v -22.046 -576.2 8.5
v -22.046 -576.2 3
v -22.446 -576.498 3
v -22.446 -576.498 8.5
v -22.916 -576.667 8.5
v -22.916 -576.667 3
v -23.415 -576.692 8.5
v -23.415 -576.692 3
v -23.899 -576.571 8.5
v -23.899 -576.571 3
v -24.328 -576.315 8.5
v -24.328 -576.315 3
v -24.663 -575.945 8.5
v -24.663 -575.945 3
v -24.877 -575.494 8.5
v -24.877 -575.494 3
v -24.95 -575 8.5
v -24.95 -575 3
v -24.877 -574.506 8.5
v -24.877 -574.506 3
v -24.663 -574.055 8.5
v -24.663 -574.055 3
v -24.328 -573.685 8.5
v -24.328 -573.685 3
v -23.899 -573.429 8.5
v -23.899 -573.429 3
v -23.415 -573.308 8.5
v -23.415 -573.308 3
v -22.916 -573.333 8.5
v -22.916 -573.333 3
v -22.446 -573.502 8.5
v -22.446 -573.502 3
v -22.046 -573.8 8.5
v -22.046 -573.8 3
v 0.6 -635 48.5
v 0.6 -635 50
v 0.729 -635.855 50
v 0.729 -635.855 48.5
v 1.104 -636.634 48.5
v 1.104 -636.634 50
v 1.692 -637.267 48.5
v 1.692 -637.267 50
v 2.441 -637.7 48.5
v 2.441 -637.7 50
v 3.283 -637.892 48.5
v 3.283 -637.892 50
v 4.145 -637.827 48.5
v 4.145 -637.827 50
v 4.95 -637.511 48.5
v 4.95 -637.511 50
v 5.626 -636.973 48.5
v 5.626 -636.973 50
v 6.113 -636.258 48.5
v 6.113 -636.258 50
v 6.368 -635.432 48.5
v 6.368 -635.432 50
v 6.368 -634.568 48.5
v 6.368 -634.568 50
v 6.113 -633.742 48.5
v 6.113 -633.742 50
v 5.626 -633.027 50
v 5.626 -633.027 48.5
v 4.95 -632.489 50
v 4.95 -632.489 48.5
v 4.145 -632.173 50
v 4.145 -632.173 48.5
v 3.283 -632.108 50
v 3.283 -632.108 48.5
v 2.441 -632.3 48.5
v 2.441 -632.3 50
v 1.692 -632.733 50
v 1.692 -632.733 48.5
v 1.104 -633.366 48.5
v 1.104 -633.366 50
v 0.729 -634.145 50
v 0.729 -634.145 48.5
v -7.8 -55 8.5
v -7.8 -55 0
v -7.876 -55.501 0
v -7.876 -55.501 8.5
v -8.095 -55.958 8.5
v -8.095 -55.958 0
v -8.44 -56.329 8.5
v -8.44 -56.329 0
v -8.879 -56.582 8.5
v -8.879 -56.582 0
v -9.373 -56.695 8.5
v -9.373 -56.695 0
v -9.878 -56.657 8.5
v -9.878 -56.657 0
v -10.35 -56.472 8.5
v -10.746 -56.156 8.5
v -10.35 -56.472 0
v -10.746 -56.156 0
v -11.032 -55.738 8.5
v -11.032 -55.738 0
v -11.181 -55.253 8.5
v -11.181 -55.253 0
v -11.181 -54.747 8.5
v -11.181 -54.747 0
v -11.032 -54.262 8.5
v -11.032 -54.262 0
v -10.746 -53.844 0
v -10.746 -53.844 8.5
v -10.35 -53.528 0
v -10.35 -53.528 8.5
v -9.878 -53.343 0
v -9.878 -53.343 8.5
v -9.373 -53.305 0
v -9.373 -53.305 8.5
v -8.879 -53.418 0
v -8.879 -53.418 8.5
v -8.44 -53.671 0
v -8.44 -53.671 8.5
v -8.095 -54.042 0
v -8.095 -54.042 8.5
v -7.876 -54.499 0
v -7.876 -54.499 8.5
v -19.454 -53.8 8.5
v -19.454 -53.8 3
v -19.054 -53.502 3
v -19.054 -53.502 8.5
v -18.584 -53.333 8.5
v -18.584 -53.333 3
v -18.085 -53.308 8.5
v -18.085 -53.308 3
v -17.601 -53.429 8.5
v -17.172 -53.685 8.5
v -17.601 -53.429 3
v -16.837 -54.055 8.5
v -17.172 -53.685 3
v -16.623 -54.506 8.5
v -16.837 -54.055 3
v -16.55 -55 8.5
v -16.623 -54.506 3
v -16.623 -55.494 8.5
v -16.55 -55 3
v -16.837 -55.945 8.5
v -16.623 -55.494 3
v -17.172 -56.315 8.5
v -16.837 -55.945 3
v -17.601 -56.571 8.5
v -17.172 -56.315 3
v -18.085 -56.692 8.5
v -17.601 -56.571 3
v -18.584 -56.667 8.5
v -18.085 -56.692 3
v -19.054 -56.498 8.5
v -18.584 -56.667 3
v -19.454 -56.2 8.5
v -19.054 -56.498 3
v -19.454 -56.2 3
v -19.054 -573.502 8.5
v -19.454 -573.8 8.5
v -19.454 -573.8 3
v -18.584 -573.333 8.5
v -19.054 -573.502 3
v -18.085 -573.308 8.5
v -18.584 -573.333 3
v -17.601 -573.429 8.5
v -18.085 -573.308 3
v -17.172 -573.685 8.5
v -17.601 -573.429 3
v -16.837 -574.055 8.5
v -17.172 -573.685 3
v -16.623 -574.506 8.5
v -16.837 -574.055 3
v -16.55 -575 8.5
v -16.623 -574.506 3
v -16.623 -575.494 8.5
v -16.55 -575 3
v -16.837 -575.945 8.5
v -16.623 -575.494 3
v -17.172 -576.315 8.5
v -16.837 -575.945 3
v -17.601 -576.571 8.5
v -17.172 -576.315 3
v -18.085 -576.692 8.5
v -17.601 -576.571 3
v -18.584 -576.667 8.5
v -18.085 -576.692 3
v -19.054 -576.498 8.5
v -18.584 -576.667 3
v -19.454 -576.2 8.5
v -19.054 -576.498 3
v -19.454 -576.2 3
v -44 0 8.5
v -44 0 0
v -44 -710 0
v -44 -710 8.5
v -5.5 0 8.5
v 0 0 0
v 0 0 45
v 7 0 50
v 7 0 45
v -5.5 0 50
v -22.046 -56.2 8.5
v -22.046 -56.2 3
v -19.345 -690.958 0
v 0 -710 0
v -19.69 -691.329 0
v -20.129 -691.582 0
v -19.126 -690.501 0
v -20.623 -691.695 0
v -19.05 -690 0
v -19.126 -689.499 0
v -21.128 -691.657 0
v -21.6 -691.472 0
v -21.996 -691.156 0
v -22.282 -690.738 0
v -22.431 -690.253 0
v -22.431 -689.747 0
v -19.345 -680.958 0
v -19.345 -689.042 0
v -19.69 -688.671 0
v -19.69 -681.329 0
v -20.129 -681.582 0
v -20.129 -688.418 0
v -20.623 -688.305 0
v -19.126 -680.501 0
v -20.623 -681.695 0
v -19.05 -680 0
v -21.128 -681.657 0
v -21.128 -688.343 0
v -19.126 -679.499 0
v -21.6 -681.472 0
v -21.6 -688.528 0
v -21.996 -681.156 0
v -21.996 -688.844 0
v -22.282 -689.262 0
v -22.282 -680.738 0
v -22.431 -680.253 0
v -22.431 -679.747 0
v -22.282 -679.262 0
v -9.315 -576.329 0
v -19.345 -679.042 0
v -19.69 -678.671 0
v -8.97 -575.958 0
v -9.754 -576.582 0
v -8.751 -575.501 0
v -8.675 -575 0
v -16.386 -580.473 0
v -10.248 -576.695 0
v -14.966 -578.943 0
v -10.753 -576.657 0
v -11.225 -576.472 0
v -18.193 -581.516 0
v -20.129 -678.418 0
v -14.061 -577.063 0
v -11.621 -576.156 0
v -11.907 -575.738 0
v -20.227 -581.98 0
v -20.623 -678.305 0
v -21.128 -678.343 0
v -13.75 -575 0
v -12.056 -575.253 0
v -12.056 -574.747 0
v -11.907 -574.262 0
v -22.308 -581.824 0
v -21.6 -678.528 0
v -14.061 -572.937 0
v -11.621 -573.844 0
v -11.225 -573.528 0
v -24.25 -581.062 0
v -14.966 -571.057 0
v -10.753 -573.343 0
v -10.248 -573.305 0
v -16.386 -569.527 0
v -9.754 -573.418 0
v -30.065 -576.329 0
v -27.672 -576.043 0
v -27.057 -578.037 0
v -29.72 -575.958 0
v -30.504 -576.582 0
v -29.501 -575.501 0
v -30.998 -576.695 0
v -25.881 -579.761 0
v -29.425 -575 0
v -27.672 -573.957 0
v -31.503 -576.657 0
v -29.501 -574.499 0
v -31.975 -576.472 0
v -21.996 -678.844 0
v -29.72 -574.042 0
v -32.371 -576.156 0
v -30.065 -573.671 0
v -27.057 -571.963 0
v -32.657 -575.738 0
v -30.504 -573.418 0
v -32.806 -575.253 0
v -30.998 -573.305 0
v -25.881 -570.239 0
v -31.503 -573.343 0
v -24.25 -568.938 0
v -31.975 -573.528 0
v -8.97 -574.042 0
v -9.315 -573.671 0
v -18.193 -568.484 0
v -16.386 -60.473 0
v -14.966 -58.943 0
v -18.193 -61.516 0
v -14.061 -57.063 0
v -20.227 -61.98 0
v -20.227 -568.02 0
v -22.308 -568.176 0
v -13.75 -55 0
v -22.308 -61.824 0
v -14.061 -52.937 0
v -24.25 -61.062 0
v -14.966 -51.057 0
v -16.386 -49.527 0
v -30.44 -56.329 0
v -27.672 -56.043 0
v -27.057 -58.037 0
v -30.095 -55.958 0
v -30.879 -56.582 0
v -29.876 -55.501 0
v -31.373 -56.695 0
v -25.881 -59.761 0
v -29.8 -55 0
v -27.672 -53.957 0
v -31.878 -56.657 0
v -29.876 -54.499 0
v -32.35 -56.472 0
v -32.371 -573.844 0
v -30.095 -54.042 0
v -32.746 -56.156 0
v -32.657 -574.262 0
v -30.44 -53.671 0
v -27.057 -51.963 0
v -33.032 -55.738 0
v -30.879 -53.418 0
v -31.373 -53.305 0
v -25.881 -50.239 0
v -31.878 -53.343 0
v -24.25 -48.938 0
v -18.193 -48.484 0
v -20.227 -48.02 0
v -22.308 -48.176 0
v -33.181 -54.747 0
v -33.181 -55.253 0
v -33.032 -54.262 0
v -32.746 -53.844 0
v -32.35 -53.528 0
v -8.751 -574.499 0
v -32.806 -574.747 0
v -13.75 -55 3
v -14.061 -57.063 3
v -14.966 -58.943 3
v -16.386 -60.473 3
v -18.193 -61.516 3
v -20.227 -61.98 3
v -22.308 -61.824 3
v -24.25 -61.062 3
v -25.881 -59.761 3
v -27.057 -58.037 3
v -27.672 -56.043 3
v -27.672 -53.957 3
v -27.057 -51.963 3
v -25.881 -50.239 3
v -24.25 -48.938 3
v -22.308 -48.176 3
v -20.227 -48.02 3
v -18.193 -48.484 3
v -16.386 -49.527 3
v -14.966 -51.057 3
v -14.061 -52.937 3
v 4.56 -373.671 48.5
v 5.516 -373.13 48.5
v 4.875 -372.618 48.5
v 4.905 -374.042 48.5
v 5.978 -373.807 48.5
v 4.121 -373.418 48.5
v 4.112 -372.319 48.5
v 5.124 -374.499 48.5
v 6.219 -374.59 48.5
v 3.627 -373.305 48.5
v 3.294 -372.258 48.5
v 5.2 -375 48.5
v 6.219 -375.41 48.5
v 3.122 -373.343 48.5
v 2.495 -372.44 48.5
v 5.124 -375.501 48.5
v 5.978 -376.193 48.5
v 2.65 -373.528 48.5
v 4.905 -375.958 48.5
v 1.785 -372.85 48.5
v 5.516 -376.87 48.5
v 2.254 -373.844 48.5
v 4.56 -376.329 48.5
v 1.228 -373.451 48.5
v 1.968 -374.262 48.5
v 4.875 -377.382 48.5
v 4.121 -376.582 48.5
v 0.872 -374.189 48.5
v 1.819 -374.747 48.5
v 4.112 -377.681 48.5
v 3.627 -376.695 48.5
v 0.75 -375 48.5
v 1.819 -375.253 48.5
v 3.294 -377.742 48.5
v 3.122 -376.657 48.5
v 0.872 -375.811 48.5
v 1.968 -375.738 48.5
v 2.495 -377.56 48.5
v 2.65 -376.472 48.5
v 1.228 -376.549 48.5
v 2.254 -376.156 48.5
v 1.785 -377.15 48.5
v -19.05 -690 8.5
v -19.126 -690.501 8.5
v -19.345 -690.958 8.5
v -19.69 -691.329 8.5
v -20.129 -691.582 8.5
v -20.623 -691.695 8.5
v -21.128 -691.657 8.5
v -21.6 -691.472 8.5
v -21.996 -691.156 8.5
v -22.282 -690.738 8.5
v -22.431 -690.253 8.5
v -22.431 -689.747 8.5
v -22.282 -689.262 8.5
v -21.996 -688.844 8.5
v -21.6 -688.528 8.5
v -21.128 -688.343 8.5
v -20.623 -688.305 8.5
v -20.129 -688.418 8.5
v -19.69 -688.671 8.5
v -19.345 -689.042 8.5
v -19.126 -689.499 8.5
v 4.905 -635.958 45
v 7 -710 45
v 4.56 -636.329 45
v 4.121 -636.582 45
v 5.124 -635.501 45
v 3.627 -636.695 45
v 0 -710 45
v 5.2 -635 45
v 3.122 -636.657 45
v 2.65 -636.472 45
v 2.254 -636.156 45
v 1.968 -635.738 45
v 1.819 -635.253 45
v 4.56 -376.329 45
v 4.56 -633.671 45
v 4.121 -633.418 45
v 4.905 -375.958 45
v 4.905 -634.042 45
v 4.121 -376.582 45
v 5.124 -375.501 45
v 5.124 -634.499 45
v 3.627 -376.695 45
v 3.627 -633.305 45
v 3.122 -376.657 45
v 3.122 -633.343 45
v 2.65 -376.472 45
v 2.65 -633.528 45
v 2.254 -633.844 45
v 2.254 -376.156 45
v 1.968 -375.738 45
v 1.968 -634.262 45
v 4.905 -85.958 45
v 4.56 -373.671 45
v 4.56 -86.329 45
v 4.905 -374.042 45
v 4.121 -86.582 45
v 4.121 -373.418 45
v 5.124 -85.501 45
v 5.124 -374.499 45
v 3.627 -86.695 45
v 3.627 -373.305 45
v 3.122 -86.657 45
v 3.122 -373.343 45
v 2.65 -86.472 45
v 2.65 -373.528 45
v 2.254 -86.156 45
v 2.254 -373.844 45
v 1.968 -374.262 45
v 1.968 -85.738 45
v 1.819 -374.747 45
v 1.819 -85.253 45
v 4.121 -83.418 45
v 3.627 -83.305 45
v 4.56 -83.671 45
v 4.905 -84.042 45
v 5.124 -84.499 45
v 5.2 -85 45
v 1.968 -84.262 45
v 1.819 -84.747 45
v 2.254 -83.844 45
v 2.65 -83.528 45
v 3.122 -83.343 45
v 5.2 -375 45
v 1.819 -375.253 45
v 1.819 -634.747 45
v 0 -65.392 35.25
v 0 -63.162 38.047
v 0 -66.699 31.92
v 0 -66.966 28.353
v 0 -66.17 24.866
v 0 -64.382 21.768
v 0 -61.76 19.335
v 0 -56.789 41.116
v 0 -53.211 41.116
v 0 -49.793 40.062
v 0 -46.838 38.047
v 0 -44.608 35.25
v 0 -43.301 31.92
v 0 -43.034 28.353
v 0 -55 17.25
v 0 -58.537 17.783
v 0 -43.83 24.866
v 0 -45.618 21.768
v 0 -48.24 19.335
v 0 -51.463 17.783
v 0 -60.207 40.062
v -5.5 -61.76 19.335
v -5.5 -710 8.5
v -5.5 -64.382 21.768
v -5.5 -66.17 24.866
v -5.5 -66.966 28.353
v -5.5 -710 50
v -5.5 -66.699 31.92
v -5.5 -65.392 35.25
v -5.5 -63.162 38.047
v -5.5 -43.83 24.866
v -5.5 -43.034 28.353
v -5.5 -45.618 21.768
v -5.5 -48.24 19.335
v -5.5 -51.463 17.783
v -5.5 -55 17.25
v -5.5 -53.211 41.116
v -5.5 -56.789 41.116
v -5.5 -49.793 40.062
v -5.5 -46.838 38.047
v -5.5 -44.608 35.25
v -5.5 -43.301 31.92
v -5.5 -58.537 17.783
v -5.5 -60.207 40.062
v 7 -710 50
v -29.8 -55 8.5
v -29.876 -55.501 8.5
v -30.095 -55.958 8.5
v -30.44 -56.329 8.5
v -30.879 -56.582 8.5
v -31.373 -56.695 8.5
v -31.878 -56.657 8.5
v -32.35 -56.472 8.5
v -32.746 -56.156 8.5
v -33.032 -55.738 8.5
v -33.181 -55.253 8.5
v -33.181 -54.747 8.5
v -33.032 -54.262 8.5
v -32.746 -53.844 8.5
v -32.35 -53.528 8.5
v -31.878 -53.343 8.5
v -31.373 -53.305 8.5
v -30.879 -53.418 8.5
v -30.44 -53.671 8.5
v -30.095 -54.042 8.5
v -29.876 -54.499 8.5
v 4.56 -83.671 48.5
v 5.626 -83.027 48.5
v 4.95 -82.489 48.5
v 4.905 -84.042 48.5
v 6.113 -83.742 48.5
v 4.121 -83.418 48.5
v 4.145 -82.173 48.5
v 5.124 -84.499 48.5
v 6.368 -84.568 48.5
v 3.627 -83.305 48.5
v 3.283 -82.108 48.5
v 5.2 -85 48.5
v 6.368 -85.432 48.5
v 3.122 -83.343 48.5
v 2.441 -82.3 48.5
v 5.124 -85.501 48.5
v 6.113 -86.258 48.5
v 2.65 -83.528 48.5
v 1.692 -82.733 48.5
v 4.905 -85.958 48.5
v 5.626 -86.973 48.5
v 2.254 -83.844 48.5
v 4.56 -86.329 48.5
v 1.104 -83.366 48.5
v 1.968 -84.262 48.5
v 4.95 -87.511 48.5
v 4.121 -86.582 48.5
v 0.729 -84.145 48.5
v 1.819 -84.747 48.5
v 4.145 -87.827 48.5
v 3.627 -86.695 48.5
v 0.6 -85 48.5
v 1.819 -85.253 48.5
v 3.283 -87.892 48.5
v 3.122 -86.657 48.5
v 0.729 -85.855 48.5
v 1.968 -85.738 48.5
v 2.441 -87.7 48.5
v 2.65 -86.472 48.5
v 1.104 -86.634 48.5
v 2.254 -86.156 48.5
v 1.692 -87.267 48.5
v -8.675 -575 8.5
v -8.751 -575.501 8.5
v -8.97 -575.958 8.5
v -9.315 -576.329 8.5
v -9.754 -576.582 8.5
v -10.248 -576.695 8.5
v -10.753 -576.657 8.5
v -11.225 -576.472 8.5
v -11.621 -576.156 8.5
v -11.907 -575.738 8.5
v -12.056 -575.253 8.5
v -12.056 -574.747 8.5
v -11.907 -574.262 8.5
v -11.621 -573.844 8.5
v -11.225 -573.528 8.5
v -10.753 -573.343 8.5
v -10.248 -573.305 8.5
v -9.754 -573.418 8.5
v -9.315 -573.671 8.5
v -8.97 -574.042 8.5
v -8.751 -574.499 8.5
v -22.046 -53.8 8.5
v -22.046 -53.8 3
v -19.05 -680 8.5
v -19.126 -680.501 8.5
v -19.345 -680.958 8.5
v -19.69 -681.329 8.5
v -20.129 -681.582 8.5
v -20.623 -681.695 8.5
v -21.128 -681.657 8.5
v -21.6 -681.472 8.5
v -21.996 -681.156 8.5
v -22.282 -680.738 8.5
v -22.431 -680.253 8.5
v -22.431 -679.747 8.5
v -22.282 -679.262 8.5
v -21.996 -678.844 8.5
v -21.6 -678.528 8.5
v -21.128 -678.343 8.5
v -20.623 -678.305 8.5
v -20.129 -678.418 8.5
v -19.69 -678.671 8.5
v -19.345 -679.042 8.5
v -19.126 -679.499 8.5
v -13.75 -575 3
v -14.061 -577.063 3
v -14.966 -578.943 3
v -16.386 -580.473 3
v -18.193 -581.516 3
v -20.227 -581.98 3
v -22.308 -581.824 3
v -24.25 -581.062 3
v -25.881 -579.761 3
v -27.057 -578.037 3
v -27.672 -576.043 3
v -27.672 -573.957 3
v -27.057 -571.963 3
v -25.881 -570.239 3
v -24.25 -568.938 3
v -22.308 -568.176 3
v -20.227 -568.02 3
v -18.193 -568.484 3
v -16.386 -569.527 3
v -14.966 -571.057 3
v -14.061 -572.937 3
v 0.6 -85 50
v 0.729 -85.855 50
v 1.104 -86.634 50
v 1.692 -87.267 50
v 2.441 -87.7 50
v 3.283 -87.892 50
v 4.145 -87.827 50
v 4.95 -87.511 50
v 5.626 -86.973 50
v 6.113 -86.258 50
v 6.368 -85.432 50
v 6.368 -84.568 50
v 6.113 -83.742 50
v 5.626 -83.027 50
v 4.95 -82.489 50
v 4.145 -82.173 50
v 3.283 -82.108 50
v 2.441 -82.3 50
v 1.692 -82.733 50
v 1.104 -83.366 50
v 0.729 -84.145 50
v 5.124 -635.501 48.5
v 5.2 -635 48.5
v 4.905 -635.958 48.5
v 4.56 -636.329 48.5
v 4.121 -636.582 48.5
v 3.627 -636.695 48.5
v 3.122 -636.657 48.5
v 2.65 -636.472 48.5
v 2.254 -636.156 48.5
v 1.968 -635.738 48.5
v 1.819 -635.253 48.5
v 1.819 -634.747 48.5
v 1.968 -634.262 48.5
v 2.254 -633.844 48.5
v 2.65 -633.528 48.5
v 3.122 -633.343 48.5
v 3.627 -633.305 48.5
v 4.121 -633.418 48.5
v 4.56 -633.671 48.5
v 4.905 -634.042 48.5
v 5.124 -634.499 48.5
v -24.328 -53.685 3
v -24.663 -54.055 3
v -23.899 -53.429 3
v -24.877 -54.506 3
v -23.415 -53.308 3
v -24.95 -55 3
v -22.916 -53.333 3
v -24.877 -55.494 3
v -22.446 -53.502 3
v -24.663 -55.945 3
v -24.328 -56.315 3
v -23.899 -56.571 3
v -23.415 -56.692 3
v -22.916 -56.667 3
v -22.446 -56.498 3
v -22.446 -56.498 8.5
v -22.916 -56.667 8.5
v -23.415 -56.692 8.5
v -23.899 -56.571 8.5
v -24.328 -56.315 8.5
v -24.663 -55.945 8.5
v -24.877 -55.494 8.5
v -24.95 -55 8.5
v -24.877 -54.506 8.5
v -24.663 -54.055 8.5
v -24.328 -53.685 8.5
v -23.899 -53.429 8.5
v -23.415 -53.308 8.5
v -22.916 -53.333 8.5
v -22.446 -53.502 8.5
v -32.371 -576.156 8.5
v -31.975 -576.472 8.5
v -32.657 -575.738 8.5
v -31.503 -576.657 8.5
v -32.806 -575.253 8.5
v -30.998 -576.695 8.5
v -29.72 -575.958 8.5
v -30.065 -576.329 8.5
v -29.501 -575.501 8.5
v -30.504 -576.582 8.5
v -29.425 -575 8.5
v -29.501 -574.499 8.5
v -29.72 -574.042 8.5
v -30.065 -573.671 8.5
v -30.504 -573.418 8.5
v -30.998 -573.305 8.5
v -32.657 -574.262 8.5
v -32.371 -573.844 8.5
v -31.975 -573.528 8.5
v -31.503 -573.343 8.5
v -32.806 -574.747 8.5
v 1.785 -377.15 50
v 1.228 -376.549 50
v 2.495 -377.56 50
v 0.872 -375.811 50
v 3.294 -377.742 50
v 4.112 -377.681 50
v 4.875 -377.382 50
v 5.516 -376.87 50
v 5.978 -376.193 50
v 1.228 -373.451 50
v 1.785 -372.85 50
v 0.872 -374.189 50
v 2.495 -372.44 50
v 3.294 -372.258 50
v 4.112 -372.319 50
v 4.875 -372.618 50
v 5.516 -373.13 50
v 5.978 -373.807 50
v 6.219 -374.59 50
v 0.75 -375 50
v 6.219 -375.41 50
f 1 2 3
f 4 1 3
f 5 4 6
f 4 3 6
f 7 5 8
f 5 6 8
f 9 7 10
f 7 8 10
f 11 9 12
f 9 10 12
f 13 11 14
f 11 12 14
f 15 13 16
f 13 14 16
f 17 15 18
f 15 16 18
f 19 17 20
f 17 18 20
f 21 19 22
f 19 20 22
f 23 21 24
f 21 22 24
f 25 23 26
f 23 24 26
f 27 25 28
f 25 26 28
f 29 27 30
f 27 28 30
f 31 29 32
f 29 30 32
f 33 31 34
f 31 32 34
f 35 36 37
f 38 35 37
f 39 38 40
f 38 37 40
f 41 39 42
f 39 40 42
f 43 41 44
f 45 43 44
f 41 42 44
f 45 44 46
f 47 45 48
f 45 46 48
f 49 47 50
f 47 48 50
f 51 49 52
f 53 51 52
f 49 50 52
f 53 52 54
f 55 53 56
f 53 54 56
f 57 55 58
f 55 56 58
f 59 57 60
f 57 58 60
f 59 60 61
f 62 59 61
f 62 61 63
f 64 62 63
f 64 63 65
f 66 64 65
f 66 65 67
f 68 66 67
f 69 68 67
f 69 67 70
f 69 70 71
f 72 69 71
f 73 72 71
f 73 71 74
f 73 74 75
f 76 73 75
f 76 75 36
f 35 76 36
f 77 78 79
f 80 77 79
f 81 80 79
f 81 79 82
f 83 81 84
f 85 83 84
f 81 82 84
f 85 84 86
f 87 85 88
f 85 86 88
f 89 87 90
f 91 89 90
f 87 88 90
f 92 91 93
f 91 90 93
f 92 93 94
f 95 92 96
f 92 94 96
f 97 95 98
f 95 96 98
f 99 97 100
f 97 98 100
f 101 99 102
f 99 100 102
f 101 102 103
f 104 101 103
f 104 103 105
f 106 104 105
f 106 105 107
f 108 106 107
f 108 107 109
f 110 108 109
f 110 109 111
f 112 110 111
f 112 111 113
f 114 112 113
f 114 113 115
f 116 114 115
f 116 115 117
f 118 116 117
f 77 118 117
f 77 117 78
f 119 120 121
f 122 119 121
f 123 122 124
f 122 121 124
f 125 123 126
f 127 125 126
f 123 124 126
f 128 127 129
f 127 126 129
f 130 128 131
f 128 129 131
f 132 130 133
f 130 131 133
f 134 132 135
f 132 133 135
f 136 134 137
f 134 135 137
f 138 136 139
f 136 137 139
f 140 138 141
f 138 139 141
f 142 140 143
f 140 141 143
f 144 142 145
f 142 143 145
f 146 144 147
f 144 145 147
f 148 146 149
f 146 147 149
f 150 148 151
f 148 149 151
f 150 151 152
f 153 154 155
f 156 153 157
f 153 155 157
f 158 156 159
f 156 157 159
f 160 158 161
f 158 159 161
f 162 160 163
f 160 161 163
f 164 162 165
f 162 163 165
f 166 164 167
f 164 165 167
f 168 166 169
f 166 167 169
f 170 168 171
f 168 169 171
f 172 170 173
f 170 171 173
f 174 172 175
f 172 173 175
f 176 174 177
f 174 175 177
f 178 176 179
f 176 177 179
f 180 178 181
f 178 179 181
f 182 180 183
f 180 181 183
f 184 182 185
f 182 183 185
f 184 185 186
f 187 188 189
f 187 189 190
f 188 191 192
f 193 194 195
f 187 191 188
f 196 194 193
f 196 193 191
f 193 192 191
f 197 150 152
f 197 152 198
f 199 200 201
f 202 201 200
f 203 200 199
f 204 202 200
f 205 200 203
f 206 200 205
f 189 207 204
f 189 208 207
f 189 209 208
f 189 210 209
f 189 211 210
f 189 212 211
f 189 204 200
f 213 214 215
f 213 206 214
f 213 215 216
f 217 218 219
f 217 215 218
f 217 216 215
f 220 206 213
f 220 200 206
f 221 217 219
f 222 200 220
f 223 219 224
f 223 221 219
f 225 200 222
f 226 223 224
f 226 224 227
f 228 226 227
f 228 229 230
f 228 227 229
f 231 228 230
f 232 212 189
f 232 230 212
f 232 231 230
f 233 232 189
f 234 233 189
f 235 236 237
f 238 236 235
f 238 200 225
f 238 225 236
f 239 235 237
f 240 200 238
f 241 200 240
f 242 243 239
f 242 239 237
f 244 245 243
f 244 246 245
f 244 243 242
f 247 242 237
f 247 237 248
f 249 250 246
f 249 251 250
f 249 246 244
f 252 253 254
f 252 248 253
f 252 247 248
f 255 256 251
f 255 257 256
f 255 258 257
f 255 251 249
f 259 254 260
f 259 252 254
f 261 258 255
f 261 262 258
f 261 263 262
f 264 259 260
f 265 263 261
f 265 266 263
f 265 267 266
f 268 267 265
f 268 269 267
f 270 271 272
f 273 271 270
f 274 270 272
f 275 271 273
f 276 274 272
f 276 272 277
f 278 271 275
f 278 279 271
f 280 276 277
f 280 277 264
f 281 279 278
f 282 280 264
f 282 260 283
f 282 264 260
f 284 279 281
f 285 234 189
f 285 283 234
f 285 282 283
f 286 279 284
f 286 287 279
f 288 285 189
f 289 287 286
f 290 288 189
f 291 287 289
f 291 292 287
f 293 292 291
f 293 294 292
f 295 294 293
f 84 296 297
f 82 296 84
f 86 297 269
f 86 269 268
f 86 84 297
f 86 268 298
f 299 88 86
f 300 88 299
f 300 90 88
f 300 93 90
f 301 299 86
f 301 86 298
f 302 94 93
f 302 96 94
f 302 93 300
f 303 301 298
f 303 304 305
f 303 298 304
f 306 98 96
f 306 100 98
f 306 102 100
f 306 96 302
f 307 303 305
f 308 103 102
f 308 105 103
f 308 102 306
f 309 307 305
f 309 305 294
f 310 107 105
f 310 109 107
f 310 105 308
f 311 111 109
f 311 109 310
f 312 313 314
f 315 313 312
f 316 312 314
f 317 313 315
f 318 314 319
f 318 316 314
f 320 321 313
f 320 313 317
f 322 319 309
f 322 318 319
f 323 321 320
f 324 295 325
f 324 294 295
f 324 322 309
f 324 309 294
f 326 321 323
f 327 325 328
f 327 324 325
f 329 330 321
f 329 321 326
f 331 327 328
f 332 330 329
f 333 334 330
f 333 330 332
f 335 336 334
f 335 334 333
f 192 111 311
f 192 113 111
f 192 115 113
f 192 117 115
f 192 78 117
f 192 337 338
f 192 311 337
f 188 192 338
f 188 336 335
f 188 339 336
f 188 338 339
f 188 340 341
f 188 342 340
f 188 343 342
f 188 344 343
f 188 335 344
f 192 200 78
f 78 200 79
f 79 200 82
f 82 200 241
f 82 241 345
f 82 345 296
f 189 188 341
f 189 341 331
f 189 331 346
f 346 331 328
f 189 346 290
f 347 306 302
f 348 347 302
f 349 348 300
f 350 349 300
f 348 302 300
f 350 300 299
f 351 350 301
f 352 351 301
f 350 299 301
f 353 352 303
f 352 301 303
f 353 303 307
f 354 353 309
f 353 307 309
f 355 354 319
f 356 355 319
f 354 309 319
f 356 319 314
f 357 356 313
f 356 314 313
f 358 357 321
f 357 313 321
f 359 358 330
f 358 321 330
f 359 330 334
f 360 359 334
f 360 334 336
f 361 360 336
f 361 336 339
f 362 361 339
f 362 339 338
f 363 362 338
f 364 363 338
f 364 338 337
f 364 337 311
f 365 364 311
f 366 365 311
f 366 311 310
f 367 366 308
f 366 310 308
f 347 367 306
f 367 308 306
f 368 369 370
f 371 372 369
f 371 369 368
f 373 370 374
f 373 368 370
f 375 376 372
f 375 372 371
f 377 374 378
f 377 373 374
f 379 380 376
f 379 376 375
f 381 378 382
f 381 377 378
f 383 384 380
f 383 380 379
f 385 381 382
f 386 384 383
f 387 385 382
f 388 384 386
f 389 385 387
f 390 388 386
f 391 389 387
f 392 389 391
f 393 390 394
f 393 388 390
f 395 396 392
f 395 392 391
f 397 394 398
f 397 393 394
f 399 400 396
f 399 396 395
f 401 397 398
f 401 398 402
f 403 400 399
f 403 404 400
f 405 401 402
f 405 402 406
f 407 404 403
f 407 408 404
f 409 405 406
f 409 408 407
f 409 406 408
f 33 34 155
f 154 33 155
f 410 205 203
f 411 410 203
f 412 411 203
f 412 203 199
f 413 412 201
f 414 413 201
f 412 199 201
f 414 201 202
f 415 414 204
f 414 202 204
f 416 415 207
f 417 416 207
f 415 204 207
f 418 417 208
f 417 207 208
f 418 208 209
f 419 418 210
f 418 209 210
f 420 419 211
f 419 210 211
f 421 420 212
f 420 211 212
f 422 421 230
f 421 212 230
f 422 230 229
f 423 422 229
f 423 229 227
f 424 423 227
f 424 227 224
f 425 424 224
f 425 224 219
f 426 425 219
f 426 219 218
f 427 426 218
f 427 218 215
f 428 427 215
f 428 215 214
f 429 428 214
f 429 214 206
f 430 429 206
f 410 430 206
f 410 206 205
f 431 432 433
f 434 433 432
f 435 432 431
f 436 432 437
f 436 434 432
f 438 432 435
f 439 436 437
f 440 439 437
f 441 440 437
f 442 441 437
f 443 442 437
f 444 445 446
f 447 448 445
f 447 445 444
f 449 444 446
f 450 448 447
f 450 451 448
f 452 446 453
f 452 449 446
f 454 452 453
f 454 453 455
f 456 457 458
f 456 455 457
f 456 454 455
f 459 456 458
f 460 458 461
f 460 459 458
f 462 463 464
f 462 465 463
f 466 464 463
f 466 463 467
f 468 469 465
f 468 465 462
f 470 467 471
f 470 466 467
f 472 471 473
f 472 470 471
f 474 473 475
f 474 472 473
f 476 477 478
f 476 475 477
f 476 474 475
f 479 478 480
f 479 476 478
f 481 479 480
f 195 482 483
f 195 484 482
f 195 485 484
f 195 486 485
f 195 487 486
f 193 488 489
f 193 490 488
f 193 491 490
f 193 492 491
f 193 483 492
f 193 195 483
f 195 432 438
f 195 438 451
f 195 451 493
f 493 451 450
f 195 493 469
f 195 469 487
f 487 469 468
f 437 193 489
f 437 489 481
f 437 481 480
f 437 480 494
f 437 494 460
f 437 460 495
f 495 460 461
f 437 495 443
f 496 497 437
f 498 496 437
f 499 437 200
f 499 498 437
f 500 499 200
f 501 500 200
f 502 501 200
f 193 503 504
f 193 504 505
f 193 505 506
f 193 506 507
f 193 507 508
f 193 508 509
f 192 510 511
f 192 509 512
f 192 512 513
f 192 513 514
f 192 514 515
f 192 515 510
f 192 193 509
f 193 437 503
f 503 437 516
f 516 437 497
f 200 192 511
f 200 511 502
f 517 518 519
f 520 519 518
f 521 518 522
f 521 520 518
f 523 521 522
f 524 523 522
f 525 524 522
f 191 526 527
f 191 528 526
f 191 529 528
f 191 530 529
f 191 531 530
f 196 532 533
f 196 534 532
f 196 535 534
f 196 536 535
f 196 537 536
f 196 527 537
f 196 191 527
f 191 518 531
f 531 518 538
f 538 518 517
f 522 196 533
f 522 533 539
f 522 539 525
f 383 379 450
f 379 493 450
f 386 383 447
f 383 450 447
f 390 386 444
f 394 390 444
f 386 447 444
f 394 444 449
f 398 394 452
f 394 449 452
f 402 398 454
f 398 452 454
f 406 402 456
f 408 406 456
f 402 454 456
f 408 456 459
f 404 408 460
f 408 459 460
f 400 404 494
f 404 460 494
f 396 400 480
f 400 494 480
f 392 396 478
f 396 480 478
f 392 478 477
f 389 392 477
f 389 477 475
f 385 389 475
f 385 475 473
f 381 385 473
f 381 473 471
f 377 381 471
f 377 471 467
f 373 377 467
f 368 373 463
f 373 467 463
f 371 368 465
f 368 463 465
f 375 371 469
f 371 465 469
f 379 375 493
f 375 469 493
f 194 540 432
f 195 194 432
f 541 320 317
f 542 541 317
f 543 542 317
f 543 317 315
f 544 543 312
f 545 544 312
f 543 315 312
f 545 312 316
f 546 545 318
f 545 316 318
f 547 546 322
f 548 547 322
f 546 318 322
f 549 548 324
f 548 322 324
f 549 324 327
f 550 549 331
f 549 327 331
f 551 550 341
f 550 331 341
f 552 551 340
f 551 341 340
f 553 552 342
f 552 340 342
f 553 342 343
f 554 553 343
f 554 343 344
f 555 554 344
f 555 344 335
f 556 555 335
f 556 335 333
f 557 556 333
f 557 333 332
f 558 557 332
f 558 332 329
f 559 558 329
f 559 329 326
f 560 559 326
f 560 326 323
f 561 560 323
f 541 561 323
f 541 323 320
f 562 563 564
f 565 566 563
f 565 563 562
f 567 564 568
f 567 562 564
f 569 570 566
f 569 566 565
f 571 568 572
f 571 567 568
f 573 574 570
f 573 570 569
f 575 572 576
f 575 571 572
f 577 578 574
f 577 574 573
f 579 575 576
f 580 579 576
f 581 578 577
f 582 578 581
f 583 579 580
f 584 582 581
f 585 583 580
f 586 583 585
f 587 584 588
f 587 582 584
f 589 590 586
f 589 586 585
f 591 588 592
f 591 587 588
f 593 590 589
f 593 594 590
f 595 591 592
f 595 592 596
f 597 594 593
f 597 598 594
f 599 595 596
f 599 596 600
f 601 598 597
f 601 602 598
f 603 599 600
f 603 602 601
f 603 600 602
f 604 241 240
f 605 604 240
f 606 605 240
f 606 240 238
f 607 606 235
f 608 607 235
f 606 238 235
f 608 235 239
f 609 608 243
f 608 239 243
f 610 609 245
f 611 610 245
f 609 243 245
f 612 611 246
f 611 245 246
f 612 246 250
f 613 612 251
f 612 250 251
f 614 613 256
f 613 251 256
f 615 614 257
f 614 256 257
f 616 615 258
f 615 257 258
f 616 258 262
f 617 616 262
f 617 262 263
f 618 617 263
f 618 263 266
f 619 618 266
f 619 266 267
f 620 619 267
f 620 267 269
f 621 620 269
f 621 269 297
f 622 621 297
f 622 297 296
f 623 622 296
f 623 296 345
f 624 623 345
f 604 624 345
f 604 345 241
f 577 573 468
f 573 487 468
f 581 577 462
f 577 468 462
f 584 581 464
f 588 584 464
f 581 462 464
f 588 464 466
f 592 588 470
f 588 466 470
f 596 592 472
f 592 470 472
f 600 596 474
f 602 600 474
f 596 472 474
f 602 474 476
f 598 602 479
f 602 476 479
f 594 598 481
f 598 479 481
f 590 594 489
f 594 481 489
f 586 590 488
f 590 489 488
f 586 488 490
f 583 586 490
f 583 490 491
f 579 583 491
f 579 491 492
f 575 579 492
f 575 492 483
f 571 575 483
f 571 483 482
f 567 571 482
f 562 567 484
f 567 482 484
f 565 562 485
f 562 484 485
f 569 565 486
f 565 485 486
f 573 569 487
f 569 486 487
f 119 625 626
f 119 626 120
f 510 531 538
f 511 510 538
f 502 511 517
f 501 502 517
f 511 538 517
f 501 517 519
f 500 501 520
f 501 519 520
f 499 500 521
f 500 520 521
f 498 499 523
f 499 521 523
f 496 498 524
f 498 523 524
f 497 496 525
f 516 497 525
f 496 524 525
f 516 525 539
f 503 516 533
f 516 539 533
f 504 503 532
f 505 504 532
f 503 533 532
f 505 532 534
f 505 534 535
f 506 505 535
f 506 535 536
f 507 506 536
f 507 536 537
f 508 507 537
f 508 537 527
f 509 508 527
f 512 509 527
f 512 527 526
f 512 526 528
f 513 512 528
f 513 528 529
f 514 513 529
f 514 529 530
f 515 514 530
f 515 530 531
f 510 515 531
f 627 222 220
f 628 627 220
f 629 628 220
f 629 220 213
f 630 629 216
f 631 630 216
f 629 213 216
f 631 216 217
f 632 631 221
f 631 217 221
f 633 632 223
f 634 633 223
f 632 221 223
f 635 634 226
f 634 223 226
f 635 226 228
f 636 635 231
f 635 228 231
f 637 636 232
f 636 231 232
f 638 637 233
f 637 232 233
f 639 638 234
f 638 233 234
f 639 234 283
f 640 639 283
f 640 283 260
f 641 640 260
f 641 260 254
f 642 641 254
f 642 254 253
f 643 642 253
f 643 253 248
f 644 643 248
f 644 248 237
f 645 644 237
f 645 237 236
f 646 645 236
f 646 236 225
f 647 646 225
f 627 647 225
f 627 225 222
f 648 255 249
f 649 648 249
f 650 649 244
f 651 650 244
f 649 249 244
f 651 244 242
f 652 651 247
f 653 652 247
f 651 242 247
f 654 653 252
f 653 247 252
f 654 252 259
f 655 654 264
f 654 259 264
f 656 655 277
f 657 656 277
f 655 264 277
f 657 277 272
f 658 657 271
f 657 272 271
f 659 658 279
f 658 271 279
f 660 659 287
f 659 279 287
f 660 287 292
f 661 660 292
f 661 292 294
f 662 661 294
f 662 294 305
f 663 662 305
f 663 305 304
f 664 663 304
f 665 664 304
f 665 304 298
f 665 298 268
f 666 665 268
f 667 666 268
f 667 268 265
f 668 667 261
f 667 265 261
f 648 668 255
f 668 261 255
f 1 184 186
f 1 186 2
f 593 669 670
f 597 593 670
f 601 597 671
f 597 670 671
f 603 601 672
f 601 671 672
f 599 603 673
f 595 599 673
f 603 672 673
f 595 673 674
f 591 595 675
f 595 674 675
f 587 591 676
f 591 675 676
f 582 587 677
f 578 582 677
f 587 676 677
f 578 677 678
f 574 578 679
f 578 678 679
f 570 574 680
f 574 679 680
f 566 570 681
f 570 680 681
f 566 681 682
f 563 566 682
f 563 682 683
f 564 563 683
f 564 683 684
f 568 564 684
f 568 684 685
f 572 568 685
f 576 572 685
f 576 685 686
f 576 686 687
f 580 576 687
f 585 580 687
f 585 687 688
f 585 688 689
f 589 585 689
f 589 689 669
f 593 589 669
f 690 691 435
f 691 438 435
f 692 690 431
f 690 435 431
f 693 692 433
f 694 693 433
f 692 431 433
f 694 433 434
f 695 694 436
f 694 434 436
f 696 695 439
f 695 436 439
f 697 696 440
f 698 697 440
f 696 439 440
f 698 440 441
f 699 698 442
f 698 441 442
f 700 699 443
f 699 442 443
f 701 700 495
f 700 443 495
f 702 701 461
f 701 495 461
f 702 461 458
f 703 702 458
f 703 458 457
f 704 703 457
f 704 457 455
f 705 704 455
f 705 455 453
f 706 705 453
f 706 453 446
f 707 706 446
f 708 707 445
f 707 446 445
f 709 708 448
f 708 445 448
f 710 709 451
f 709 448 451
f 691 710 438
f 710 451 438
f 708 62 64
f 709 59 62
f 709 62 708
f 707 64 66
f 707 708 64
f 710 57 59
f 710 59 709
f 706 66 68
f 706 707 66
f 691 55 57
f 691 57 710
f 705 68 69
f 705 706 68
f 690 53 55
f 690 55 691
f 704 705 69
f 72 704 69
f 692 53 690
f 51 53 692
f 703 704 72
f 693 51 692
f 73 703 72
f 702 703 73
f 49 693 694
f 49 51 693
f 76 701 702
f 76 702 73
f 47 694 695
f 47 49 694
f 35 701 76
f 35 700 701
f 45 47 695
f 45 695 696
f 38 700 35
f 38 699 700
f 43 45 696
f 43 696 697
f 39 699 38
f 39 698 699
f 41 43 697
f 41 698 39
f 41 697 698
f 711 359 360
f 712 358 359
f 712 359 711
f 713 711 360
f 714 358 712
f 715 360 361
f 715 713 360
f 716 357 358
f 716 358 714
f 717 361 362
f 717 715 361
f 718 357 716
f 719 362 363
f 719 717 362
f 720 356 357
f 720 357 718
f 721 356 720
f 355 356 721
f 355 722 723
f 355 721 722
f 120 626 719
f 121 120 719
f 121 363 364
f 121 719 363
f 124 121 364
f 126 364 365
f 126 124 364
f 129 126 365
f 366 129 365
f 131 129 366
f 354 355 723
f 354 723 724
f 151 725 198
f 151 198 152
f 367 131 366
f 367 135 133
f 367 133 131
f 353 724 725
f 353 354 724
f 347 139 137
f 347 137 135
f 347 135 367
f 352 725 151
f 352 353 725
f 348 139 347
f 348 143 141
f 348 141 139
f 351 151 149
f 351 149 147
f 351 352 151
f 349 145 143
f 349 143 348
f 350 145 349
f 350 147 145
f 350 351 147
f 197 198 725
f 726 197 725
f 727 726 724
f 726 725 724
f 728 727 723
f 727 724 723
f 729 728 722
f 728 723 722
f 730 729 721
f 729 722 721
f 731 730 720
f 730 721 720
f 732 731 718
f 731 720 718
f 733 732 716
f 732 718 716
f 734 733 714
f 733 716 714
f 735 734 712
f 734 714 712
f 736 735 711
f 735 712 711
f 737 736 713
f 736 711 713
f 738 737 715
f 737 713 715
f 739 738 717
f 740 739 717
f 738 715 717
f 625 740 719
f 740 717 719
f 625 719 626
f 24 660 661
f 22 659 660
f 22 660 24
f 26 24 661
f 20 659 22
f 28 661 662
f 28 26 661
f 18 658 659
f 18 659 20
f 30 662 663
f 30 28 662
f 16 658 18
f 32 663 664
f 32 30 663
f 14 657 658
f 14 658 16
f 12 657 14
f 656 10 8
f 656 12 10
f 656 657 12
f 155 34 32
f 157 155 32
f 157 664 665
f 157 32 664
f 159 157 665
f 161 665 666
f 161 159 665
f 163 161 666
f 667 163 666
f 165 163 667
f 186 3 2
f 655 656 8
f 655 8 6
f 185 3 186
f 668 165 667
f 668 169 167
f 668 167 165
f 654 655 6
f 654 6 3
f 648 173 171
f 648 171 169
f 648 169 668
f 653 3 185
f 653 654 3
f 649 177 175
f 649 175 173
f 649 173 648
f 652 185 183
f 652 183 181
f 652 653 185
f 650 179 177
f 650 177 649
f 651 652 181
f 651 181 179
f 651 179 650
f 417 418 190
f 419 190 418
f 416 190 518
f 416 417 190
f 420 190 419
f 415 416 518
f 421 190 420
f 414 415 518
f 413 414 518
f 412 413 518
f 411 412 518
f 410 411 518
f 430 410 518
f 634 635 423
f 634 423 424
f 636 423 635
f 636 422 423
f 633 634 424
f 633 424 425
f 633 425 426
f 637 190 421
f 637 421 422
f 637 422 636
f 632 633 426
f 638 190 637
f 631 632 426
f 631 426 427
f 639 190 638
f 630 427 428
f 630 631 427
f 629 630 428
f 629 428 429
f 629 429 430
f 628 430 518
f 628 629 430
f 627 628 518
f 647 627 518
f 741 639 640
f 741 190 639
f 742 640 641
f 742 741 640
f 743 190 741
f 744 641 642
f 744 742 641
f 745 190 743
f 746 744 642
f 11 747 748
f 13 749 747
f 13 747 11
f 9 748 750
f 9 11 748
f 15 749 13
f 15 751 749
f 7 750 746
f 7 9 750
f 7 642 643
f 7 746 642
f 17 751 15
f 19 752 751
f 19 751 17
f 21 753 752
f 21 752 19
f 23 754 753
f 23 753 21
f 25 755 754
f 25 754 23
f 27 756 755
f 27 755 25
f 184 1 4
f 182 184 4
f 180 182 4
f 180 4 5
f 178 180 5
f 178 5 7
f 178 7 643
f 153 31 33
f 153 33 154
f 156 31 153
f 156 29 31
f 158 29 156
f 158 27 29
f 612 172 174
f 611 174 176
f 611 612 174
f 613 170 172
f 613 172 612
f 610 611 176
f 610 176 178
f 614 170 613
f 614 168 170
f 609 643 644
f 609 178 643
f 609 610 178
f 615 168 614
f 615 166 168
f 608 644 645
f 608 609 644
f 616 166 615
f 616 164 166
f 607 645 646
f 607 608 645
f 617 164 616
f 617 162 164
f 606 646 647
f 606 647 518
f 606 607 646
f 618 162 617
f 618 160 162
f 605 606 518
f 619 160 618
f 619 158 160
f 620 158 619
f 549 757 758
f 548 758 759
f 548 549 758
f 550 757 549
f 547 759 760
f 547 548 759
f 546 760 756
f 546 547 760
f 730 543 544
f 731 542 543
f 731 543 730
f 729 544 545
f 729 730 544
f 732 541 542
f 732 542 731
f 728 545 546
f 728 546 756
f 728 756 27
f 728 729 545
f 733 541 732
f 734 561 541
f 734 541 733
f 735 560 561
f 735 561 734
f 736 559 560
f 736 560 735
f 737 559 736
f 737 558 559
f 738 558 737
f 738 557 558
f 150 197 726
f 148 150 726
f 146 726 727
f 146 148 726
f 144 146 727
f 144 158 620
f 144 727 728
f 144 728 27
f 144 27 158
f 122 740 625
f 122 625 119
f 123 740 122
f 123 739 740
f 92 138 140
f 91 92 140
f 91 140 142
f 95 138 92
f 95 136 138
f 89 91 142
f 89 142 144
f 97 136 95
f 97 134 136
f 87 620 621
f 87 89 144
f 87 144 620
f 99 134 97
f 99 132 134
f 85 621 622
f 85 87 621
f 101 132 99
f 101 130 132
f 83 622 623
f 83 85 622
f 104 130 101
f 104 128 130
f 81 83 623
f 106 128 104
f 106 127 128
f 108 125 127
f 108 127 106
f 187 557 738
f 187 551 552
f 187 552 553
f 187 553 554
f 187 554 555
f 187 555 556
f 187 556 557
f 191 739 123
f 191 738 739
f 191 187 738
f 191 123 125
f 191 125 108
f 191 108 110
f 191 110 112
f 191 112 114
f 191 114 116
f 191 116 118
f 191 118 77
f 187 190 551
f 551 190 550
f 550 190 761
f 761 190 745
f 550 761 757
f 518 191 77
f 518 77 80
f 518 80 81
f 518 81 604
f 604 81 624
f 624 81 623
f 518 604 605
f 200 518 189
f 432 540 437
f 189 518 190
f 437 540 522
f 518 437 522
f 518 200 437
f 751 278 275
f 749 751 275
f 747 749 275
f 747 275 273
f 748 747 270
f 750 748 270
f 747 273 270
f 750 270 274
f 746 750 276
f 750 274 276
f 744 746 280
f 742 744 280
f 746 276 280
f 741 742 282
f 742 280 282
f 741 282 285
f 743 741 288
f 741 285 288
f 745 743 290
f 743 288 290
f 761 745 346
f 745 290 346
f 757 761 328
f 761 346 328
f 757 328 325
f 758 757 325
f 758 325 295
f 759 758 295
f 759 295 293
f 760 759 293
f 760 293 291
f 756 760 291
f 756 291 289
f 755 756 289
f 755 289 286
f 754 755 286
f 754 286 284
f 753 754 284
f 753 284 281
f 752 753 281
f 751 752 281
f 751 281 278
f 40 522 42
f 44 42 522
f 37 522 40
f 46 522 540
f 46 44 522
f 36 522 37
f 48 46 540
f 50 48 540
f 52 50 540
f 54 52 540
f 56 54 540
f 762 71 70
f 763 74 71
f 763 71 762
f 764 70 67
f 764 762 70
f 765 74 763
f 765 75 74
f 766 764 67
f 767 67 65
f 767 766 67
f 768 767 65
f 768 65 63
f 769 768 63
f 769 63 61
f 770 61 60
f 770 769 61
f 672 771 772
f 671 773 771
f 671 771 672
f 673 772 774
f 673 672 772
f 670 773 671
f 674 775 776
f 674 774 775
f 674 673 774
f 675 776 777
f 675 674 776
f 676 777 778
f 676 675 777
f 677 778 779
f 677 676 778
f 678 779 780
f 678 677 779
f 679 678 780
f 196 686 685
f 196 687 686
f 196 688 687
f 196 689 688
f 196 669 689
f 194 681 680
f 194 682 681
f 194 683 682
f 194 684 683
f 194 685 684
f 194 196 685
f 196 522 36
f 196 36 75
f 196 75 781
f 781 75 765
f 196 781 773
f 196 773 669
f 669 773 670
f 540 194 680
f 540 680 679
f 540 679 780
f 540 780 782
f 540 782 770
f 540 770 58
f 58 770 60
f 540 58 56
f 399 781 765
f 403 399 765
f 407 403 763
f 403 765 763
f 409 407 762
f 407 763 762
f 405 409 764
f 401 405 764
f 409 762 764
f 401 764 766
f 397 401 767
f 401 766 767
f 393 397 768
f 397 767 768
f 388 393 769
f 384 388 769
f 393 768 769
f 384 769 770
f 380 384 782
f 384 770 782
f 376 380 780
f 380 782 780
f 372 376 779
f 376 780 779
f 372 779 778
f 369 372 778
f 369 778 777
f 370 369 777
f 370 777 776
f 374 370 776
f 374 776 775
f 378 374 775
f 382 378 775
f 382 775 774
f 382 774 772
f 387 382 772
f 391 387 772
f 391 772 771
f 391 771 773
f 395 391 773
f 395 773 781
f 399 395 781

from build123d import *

# Parameters (mm, degrees)
PAD_DEPTH           = 710
HOLE_D              = 3.4
HOLE_DEPTH          = 25
HOLE_CBORE_D        = 5.8
HOLE_CBORE_DEPTH    = 1.5
HOLE_TIPS_R         = 1.7
HOLE001_D           = 3.4
HOLE001_DEPTH       = 25
HOLE001_CBORE_D     = 5.5
HOLE001_CBORE_DEPTH = 1.5
HOLE001_TIPS_R      = 1.7
SKETCH004_R         = 7
POCKET_DEPTH        = 3
SKETCH005_R         = 1.7
HOLE002_DEPTH       = 25
HOLE002_TIPS_R      = 1.7
POCKET001_DEPTH     = 47.001
SKETCH007_R         = 1.7
HOLE003_DEPTH       = 25
HOLE003_TIPS_R      = 1.7
SKETCH009_R         = 12
POCKET002_DEPTH     = 12.501
SKETCH011_R         = 1.7
HOLE004_DEPTH       = 50.001
SKETCH010_R         = 1.7
HOLE005_DEPTH       = 50.001
SKETCH012_R         = 7
POCKET003_DEPTH     = 3
POCKET004_DEPTH     = 47.001
SKETCH014_R         = 1.7
HOLE006_DEPTH       = 25
HOLE006_TIPS_R      = 1.7


with BuildPart() as part:
    # Sketch → Pad (new body)
    with BuildSketch(Plane.XZ):
        Polygon((0, 0), (-44, 0), (-44, 8.5), (-5.5, 8.5), (-5.5, 50), (7, 50), (7, 45), (0, 45), align=None)
    extrude(amount=PAD_DEPTH)

    # Hole
    with Locations(Plane(origin=(0, 0, 50), x_dir=(-1, 0, 0), z_dir=(0, 0, 1))):
        with Locations((-3.5, 85), (-3.5, 635)):
            CounterBoreHole(HOLE_D / 2, HOLE_CBORE_D / 2, HOLE_CBORE_DEPTH, depth=HOLE_DEPTH)

    # Hole tips → Hole tip 1 section 0
    with BuildSketch(Plane(origin=(0, 0, 25), x_dir=(-1, 0, 0), z_dir=(0, 0, 1)), mode=Mode.PRIVATE) as hole_tip_1_s0:
        with Locations((-3.5, 85)):
            Circle(HOLE_TIPS_R)
    loft([hole_tip_1_s0.sketch, Vertex(3.5, -85, 23.978537)], mode=Mode.SUBTRACT)

    # Hole tips → Hole tip 2 section 0
    with BuildSketch(Plane(origin=(0, 0, 25), x_dir=(-1, 0, 0), z_dir=(0, 0, 1)), mode=Mode.PRIVATE) as hole_tip_2_s0:
        with Locations((-3.5, 635)):
            Circle(HOLE_TIPS_R)
    loft([hole_tip_2_s0.sketch, Vertex(3.5, -635, 23.978537)], mode=Mode.SUBTRACT)

    # Hole001
    with Locations(Plane(origin=(0, 0, 50), x_dir=(-1, 0, 0), z_dir=(0, 0, 1))):
        with Locations((-3.5, 375)):
            CounterBoreHole(HOLE001_D / 2, HOLE001_CBORE_D / 2, HOLE001_CBORE_DEPTH, depth=HOLE001_DEPTH)

    # Hole001 tips → Hole001 tip 1 section 0
    with BuildSketch(Plane(origin=(0, 0, 25), x_dir=(-1, 0, 0), z_dir=(0, 0, 1)), mode=Mode.PRIVATE) as hole001_tip_1_s0:
        with Locations((-3.5, 375)):
            Circle(HOLE001_TIPS_R)
    loft([hole001_tip_1_s0.sketch, Vertex(3.5, -375, 23.978537)], mode=Mode.SUBTRACT)

    # Sketch004 → Pocket (cut)
    with BuildSketch(Plane(origin=(0, 0, 0), x_dir=(1, 0, 0), z_dir=(0, 0, -1))):
        with Locations((-20.75, 55)):
            Circle(SKETCH004_R)
    extrude(amount=-POCKET_DEPTH, mode=Mode.SUBTRACT)

    # Sketch005 (on Face1 of Pocket) → Hole002 (cut)
    with BuildSketch(Plane(origin=(0, 0, 0), x_dir=(1, 0, 0), z_dir=(0, 0, -1))):
        with Locations((-31.5, 55)):
            Circle(SKETCH005_R)
        with Locations((-9.5, 55)):
            Circle(SKETCH005_R)
    extrude(amount=-HOLE002_DEPTH, mode=Mode.SUBTRACT)

    # Hole002 tips → Hole002 tip 1 section 0
    with BuildSketch(Plane(origin=(0, 0, 25), x_dir=(1, 0, 0), z_dir=(0, 0, -1)), mode=Mode.PRIVATE) as hole002_tip_1_s0:
        with Locations((-31.5, 55)):
            Circle(HOLE002_TIPS_R)
    loft([hole002_tip_1_s0.sketch, Vertex(-31.5, -55, 26.021463)], mode=Mode.SUBTRACT)

    # Hole002 tips → Hole002 tip 2 section 0
    with BuildSketch(Plane(origin=(0, 0, 25), x_dir=(1, 0, 0), z_dir=(0, 0, -1)), mode=Mode.PRIVATE) as hole002_tip_2_s0:
        with Locations((-9.5, 55)):
            Circle(HOLE002_TIPS_R)
    loft([hole002_tip_2_s0.sketch, Vertex(-9.5, -55, 26.021463)], mode=Mode.SUBTRACT)

    # Sketch006 → Pocket001 (cut, through all)
    with BuildSketch(Plane(origin=(0, 0, 3), x_dir=(1, 0, 0), z_dir=(0, 0, -1))):
        with BuildLine():
            ThreePointArc((-23.25, 56.2), (-24.45, 55), (-23.25, 53.8))
            Line((-23.25, 53.8), (-18.25, 53.8))
            ThreePointArc((-18.25, 53.8), (-17.05, 55), (-18.25, 56.2))
            Line((-18.25, 56.2), (-23.25, 56.2))
        make_face()
    extrude(amount=-POCKET001_DEPTH, mode=Mode.SUBTRACT)

    # Sketch007 → Hole003 (cut)
    with BuildSketch(Plane(origin=(0, 0, 3), x_dir=(1, 0, 0), z_dir=(0, 0, -1))):
        with Locations((-23.25, 55)):
            Circle(SKETCH007_R)
        with Locations((-18.25, 55)):
            Circle(SKETCH007_R)
    extrude(amount=-HOLE003_DEPTH, mode=Mode.SUBTRACT)

    # Hole003 tips → Hole003 tip 1 section 0
    with BuildSketch(Plane(origin=(0, 0, 28), x_dir=(1, 0, 0), z_dir=(0, 0, -1)), mode=Mode.PRIVATE) as hole003_tip_1_s0:
        with Locations((-23.25, 55)):
            Circle(HOLE003_TIPS_R)
    loft([hole003_tip_1_s0.sketch, Vertex(-23.25, -55, 29.021463)], mode=Mode.SUBTRACT)

    # Hole003 tips → Hole003 tip 2 section 0
    with BuildSketch(Plane(origin=(0, 0, 28), x_dir=(1, 0, 0), z_dir=(0, 0, -1)), mode=Mode.PRIVATE) as hole003_tip_2_s0:
        with Locations((-18.25, 55)):
            Circle(HOLE003_TIPS_R)
    loft([hole003_tip_2_s0.sketch, Vertex(-18.25, -55, 29.021463)], mode=Mode.SUBTRACT)

    # Sketch009 → Pocket002 (cut, through all)
    with BuildSketch(Plane(origin=(-5.5, 0, 0), x_dir=(0, 0, -1), z_dir=(-1, 0, 0))):
        with Locations((-29.25, 55)):
            Circle(SKETCH009_R)
    extrude(amount=-POCKET002_DEPTH, mode=Mode.SUBTRACT)

    # Sketch011 → Hole004 (cut, through all)
    with BuildSketch(Plane(origin=(0, 0, 0), x_dir=(1, 0, 0), z_dir=(0, 0, -1))):
        with Locations((-20.75, 690)):
            Circle(SKETCH011_R)
        with Locations((-20.75, 680)):
            Circle(SKETCH011_R)
    extrude(amount=-HOLE004_DEPTH, mode=Mode.SUBTRACT)

    # Sketch010 → Hole005 (cut, through all)
    with BuildSketch(Plane(origin=(0, 0, 0), x_dir=(1, 0, 0), z_dir=(0, 0, -1))):
        with Locations((-31.125, 575)):
            Circle(SKETCH010_R)
        with Locations((-10.375, 575)):
            Circle(SKETCH010_R)
    extrude(amount=-HOLE005_DEPTH, mode=Mode.SUBTRACT)

    # Sketch012 → Pocket003 (cut)
    with BuildSketch(Plane(origin=(0, 0, 0), x_dir=(1, 0, 0), z_dir=(0, 0, -1))):
        with Locations((-20.75, 575)):
            Circle(SKETCH012_R)
    extrude(amount=-POCKET003_DEPTH, mode=Mode.SUBTRACT)

    # Sketch013 → Pocket004 (cut, through all)
    with BuildSketch(Plane(origin=(0, 0, 3), x_dir=(1, 0, 0), z_dir=(0, 0, -1))):
        with BuildLine():
            ThreePointArc((-23.25, 576.2), (-24.45, 575), (-23.25, 573.8))
            Line((-23.25, 573.8), (-18.25, 573.8))
            ThreePointArc((-18.25, 573.8), (-17.05, 575), (-18.25, 576.2))
            Line((-18.25, 576.2), (-23.25, 576.2))
        make_face()
    extrude(amount=-POCKET004_DEPTH, mode=Mode.SUBTRACT)

    # Sketch014 → Hole006 (cut)
    with BuildSketch(Plane(origin=(0, 0, 3), x_dir=(1, 0, 0), z_dir=(0, 0, -1))):
        with Locations((-18.25, 575)):
            Circle(SKETCH014_R)
        with Locations((-23.25, 575)):
            Circle(SKETCH014_R)
    extrude(amount=-HOLE006_DEPTH, mode=Mode.SUBTRACT)

    # Hole006 tips → Hole006 tip 1 section 0
    with BuildSketch(Plane(origin=(0, 0, 28), x_dir=(1, 0, 0), z_dir=(0, 0, -1)), mode=Mode.PRIVATE) as hole006_tip_1_s0:
        with Locations((-18.25, 575)):
            Circle(HOLE006_TIPS_R)
    loft([hole006_tip_1_s0.sketch, Vertex(-18.25, -575, 29.021463)], mode=Mode.SUBTRACT)

    # Hole006 tips → Hole006 tip 2 section 0
    with BuildSketch(Plane(origin=(0, 0, 28), x_dir=(1, 0, 0), z_dir=(0, 0, -1)), mode=Mode.PRIVATE) as hole006_tip_2_s0:
        with Locations((-23.25, 575)):
            Circle(HOLE006_TIPS_R)
    loft([hole006_tip_2_s0.sketch, Vertex(-23.25, -575, 29.021463)], mode=Mode.SUBTRACT)


solid = part.part
